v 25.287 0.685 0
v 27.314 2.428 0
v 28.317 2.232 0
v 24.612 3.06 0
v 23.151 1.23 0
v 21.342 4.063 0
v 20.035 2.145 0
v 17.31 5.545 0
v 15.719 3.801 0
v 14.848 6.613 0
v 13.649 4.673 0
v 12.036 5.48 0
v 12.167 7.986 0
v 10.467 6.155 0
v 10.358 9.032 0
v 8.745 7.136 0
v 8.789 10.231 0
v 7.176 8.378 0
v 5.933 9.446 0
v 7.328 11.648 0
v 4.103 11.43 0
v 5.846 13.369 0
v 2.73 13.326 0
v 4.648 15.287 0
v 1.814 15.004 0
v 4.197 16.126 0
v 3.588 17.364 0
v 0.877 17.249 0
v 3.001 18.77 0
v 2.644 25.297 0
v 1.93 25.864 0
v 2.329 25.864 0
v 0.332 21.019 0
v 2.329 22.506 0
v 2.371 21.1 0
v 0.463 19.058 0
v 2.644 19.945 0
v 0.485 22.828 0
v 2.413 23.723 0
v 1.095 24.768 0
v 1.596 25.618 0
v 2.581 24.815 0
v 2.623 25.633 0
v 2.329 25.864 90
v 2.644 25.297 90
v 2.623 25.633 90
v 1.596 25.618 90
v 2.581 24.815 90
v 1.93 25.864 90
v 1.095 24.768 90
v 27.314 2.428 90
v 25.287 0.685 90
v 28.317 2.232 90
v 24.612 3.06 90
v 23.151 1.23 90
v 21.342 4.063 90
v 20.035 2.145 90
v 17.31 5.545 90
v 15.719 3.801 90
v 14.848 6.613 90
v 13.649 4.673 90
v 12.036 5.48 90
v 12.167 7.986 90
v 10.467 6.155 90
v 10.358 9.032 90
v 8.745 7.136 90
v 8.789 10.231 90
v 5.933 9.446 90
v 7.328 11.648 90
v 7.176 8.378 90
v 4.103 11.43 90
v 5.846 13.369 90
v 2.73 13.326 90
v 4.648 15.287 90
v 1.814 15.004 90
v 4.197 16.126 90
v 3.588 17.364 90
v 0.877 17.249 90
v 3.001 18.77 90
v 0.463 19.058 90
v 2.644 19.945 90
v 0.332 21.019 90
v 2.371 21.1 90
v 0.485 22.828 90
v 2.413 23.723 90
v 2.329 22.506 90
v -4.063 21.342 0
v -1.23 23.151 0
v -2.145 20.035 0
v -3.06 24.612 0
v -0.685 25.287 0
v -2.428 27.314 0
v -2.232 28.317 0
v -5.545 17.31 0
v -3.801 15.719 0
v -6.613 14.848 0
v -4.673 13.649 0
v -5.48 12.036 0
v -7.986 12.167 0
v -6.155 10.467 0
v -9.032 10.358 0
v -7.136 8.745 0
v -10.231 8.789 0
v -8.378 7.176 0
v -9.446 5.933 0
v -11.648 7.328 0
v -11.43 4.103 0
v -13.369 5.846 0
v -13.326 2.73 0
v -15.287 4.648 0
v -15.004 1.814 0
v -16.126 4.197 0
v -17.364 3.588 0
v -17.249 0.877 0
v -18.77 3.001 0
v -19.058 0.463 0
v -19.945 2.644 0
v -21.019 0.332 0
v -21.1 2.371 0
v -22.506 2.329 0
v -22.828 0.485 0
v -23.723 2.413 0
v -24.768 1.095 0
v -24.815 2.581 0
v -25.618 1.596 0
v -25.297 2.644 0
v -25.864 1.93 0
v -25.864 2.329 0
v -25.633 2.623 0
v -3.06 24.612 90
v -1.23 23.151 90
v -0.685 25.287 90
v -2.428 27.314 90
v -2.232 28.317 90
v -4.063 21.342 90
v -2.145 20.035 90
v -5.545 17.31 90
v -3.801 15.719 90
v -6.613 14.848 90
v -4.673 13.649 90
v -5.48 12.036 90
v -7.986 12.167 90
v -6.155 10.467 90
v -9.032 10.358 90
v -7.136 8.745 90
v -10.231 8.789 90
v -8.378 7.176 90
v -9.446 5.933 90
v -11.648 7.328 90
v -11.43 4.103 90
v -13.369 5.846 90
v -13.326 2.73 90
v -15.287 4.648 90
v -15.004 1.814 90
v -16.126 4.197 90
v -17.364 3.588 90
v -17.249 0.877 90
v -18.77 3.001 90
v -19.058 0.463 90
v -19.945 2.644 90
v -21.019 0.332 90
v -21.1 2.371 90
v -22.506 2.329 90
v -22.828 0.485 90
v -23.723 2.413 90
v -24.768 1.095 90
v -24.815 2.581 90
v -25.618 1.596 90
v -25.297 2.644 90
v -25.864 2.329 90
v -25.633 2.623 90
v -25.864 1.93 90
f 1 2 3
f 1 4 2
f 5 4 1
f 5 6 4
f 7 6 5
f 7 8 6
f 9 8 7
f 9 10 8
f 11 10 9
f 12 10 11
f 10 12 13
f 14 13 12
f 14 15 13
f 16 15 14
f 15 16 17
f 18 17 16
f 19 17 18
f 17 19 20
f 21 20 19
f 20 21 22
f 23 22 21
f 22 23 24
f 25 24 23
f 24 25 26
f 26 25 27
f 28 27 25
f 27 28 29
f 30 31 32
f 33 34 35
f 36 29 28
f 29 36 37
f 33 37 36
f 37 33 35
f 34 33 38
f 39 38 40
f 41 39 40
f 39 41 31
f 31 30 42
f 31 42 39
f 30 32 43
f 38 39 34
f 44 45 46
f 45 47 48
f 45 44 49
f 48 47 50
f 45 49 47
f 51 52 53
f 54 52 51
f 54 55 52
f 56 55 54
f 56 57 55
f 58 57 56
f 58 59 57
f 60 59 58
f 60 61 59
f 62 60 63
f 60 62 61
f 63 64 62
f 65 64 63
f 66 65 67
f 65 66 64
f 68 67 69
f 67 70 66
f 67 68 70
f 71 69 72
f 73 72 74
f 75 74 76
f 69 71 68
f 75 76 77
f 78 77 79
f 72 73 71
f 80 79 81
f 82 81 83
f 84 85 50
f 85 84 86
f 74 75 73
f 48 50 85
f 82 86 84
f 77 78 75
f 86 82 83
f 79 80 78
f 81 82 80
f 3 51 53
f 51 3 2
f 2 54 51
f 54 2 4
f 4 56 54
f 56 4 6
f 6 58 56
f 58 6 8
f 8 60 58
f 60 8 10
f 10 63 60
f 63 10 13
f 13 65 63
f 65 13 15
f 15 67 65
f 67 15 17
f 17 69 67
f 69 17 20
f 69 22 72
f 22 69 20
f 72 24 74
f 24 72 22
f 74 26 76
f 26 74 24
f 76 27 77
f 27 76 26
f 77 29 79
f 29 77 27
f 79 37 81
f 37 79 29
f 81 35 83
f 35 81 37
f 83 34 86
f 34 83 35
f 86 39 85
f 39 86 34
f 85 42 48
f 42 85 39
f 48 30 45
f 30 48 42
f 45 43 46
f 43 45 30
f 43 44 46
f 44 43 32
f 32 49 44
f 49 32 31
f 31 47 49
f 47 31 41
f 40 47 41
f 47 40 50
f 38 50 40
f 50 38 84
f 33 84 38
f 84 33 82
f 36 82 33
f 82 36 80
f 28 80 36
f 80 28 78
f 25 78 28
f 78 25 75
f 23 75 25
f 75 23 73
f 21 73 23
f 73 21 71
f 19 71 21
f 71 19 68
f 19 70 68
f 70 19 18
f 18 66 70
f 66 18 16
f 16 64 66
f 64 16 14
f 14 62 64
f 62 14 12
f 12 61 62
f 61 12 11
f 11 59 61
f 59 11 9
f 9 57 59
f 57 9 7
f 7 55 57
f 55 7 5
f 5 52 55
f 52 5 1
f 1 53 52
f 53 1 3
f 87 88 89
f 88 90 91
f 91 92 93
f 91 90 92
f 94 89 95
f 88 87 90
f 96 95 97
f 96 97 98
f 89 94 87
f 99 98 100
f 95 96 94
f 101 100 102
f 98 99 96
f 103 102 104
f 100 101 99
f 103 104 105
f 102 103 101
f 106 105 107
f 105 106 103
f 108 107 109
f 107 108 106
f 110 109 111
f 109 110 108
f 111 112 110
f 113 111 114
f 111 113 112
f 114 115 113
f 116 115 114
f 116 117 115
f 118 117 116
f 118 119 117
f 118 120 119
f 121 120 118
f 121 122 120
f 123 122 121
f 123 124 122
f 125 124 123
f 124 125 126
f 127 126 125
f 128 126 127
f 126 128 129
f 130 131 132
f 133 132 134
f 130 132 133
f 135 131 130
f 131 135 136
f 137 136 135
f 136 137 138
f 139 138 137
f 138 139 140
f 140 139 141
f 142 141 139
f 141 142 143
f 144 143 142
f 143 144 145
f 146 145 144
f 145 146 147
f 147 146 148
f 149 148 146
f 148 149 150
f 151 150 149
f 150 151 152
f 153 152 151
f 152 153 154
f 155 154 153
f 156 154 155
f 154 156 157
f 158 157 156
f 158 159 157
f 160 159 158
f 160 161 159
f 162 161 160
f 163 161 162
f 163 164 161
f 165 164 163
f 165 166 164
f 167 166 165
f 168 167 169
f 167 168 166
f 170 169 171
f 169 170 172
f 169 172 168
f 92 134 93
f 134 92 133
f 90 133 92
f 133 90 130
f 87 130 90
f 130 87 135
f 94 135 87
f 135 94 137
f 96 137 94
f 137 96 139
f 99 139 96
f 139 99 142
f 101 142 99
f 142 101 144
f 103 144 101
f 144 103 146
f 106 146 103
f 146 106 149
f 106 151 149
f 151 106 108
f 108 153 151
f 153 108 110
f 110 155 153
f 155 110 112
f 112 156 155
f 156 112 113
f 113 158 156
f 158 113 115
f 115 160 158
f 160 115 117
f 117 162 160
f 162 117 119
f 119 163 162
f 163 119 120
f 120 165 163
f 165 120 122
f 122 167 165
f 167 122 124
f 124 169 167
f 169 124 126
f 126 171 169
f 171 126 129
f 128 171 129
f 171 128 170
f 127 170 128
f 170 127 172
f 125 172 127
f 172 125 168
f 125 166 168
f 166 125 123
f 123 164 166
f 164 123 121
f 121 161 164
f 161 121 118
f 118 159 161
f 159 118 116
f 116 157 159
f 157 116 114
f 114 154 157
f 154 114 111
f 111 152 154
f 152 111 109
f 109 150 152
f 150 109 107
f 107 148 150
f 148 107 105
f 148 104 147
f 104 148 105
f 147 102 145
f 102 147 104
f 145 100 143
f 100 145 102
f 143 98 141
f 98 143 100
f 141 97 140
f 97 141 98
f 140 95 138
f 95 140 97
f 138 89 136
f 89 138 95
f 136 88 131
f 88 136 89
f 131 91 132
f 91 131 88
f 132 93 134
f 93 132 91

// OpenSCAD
module leaf() {

    extrude_h = 90;
    scale_factor = 0.017;

    points_raw = [
        [93.89743589743591, 21.05128205128213],
        [64.41025641025644, 71.05128205128213],
        [28.512820512820525, 185.15384615384625],
        [19.538461538461547, 291.56410256410265],
        [27.230769230769255, 406.94871794871807],
        [51.58974358974362, 513.3589743589744],
        [106.71794871794873, 645.4102564102566],
        [160.5641025641026, 744.1282051282051],
        [241.33333333333337, 855.6666666666667],
        [349.02564102564105, 972.3333333333335],
        [422.10256410256414, 1035.1538461538462],
        [514.4102564102564, 1108.2307692307693],
        [615.6923076923076, 1165.9230769230771],
        [708.0, 1205.6666666666667],
        [802.8717948717949, 1253.1025641025642],
        [924.6666666666667, 1304.3846153846155],
        [1178.5128205128206, 1401.820512820513],
        [1361.8461538461538, 1455.6666666666667],
        [1487.4871794871794, 1487.7179487179487],
        [1665.6923076923076, 1396.6923076923078],
        [1606.7179487179487, 1385.1538461538462],
        [1447.7435897435898, 1347.9743589743591],
        [1255.4358974358975, 1289.0],
        [1018.2564102564104, 1201.820512820513],
        [873.3846153846155, 1139.0],
        [715.6923076923076, 1058.2307692307693],
        [609.2820512820513, 996.6923076923078],
        [516.9743589743589, 926.1794871794873],
        [431.07692307692304, 842.8461538461538],
        [343.8974358974359, 741.5641025641025],
        [273.3846153846154, 628.7435897435898],
        [246.8888888888889, 579.4320987654321],
        [211.08641975308643, 506.5925925925926],
        [176.51851851851853, 423.87654320987656],
        [155.5308641975309, 354.74074074074076],
        [139.48148148148152, 286.8395061728395],
        [137.01234567901236, 204.12345679012347],
        [141.95061728395063, 132.51851851851856],
        [151.8271604938272, 68.32098765432102],
        [155.5308641975309, 39.92592592592595],
        [154.2962962962963, 20.172839506172892],
        [137.01234567901236, 6.592592592592638],
        [113.5555555555556, 6.592592592592638]
    ];

    points = [for (p = points_raw) [p[0] * scale_factor, (1528 - p[1]) * scale_factor]];

    linear_extrude(height = extrude_h)
        polygon(points);

}

rotate([0, 0, 00])
    leaf();

rotate([0, 0, 90])
    leaf();
